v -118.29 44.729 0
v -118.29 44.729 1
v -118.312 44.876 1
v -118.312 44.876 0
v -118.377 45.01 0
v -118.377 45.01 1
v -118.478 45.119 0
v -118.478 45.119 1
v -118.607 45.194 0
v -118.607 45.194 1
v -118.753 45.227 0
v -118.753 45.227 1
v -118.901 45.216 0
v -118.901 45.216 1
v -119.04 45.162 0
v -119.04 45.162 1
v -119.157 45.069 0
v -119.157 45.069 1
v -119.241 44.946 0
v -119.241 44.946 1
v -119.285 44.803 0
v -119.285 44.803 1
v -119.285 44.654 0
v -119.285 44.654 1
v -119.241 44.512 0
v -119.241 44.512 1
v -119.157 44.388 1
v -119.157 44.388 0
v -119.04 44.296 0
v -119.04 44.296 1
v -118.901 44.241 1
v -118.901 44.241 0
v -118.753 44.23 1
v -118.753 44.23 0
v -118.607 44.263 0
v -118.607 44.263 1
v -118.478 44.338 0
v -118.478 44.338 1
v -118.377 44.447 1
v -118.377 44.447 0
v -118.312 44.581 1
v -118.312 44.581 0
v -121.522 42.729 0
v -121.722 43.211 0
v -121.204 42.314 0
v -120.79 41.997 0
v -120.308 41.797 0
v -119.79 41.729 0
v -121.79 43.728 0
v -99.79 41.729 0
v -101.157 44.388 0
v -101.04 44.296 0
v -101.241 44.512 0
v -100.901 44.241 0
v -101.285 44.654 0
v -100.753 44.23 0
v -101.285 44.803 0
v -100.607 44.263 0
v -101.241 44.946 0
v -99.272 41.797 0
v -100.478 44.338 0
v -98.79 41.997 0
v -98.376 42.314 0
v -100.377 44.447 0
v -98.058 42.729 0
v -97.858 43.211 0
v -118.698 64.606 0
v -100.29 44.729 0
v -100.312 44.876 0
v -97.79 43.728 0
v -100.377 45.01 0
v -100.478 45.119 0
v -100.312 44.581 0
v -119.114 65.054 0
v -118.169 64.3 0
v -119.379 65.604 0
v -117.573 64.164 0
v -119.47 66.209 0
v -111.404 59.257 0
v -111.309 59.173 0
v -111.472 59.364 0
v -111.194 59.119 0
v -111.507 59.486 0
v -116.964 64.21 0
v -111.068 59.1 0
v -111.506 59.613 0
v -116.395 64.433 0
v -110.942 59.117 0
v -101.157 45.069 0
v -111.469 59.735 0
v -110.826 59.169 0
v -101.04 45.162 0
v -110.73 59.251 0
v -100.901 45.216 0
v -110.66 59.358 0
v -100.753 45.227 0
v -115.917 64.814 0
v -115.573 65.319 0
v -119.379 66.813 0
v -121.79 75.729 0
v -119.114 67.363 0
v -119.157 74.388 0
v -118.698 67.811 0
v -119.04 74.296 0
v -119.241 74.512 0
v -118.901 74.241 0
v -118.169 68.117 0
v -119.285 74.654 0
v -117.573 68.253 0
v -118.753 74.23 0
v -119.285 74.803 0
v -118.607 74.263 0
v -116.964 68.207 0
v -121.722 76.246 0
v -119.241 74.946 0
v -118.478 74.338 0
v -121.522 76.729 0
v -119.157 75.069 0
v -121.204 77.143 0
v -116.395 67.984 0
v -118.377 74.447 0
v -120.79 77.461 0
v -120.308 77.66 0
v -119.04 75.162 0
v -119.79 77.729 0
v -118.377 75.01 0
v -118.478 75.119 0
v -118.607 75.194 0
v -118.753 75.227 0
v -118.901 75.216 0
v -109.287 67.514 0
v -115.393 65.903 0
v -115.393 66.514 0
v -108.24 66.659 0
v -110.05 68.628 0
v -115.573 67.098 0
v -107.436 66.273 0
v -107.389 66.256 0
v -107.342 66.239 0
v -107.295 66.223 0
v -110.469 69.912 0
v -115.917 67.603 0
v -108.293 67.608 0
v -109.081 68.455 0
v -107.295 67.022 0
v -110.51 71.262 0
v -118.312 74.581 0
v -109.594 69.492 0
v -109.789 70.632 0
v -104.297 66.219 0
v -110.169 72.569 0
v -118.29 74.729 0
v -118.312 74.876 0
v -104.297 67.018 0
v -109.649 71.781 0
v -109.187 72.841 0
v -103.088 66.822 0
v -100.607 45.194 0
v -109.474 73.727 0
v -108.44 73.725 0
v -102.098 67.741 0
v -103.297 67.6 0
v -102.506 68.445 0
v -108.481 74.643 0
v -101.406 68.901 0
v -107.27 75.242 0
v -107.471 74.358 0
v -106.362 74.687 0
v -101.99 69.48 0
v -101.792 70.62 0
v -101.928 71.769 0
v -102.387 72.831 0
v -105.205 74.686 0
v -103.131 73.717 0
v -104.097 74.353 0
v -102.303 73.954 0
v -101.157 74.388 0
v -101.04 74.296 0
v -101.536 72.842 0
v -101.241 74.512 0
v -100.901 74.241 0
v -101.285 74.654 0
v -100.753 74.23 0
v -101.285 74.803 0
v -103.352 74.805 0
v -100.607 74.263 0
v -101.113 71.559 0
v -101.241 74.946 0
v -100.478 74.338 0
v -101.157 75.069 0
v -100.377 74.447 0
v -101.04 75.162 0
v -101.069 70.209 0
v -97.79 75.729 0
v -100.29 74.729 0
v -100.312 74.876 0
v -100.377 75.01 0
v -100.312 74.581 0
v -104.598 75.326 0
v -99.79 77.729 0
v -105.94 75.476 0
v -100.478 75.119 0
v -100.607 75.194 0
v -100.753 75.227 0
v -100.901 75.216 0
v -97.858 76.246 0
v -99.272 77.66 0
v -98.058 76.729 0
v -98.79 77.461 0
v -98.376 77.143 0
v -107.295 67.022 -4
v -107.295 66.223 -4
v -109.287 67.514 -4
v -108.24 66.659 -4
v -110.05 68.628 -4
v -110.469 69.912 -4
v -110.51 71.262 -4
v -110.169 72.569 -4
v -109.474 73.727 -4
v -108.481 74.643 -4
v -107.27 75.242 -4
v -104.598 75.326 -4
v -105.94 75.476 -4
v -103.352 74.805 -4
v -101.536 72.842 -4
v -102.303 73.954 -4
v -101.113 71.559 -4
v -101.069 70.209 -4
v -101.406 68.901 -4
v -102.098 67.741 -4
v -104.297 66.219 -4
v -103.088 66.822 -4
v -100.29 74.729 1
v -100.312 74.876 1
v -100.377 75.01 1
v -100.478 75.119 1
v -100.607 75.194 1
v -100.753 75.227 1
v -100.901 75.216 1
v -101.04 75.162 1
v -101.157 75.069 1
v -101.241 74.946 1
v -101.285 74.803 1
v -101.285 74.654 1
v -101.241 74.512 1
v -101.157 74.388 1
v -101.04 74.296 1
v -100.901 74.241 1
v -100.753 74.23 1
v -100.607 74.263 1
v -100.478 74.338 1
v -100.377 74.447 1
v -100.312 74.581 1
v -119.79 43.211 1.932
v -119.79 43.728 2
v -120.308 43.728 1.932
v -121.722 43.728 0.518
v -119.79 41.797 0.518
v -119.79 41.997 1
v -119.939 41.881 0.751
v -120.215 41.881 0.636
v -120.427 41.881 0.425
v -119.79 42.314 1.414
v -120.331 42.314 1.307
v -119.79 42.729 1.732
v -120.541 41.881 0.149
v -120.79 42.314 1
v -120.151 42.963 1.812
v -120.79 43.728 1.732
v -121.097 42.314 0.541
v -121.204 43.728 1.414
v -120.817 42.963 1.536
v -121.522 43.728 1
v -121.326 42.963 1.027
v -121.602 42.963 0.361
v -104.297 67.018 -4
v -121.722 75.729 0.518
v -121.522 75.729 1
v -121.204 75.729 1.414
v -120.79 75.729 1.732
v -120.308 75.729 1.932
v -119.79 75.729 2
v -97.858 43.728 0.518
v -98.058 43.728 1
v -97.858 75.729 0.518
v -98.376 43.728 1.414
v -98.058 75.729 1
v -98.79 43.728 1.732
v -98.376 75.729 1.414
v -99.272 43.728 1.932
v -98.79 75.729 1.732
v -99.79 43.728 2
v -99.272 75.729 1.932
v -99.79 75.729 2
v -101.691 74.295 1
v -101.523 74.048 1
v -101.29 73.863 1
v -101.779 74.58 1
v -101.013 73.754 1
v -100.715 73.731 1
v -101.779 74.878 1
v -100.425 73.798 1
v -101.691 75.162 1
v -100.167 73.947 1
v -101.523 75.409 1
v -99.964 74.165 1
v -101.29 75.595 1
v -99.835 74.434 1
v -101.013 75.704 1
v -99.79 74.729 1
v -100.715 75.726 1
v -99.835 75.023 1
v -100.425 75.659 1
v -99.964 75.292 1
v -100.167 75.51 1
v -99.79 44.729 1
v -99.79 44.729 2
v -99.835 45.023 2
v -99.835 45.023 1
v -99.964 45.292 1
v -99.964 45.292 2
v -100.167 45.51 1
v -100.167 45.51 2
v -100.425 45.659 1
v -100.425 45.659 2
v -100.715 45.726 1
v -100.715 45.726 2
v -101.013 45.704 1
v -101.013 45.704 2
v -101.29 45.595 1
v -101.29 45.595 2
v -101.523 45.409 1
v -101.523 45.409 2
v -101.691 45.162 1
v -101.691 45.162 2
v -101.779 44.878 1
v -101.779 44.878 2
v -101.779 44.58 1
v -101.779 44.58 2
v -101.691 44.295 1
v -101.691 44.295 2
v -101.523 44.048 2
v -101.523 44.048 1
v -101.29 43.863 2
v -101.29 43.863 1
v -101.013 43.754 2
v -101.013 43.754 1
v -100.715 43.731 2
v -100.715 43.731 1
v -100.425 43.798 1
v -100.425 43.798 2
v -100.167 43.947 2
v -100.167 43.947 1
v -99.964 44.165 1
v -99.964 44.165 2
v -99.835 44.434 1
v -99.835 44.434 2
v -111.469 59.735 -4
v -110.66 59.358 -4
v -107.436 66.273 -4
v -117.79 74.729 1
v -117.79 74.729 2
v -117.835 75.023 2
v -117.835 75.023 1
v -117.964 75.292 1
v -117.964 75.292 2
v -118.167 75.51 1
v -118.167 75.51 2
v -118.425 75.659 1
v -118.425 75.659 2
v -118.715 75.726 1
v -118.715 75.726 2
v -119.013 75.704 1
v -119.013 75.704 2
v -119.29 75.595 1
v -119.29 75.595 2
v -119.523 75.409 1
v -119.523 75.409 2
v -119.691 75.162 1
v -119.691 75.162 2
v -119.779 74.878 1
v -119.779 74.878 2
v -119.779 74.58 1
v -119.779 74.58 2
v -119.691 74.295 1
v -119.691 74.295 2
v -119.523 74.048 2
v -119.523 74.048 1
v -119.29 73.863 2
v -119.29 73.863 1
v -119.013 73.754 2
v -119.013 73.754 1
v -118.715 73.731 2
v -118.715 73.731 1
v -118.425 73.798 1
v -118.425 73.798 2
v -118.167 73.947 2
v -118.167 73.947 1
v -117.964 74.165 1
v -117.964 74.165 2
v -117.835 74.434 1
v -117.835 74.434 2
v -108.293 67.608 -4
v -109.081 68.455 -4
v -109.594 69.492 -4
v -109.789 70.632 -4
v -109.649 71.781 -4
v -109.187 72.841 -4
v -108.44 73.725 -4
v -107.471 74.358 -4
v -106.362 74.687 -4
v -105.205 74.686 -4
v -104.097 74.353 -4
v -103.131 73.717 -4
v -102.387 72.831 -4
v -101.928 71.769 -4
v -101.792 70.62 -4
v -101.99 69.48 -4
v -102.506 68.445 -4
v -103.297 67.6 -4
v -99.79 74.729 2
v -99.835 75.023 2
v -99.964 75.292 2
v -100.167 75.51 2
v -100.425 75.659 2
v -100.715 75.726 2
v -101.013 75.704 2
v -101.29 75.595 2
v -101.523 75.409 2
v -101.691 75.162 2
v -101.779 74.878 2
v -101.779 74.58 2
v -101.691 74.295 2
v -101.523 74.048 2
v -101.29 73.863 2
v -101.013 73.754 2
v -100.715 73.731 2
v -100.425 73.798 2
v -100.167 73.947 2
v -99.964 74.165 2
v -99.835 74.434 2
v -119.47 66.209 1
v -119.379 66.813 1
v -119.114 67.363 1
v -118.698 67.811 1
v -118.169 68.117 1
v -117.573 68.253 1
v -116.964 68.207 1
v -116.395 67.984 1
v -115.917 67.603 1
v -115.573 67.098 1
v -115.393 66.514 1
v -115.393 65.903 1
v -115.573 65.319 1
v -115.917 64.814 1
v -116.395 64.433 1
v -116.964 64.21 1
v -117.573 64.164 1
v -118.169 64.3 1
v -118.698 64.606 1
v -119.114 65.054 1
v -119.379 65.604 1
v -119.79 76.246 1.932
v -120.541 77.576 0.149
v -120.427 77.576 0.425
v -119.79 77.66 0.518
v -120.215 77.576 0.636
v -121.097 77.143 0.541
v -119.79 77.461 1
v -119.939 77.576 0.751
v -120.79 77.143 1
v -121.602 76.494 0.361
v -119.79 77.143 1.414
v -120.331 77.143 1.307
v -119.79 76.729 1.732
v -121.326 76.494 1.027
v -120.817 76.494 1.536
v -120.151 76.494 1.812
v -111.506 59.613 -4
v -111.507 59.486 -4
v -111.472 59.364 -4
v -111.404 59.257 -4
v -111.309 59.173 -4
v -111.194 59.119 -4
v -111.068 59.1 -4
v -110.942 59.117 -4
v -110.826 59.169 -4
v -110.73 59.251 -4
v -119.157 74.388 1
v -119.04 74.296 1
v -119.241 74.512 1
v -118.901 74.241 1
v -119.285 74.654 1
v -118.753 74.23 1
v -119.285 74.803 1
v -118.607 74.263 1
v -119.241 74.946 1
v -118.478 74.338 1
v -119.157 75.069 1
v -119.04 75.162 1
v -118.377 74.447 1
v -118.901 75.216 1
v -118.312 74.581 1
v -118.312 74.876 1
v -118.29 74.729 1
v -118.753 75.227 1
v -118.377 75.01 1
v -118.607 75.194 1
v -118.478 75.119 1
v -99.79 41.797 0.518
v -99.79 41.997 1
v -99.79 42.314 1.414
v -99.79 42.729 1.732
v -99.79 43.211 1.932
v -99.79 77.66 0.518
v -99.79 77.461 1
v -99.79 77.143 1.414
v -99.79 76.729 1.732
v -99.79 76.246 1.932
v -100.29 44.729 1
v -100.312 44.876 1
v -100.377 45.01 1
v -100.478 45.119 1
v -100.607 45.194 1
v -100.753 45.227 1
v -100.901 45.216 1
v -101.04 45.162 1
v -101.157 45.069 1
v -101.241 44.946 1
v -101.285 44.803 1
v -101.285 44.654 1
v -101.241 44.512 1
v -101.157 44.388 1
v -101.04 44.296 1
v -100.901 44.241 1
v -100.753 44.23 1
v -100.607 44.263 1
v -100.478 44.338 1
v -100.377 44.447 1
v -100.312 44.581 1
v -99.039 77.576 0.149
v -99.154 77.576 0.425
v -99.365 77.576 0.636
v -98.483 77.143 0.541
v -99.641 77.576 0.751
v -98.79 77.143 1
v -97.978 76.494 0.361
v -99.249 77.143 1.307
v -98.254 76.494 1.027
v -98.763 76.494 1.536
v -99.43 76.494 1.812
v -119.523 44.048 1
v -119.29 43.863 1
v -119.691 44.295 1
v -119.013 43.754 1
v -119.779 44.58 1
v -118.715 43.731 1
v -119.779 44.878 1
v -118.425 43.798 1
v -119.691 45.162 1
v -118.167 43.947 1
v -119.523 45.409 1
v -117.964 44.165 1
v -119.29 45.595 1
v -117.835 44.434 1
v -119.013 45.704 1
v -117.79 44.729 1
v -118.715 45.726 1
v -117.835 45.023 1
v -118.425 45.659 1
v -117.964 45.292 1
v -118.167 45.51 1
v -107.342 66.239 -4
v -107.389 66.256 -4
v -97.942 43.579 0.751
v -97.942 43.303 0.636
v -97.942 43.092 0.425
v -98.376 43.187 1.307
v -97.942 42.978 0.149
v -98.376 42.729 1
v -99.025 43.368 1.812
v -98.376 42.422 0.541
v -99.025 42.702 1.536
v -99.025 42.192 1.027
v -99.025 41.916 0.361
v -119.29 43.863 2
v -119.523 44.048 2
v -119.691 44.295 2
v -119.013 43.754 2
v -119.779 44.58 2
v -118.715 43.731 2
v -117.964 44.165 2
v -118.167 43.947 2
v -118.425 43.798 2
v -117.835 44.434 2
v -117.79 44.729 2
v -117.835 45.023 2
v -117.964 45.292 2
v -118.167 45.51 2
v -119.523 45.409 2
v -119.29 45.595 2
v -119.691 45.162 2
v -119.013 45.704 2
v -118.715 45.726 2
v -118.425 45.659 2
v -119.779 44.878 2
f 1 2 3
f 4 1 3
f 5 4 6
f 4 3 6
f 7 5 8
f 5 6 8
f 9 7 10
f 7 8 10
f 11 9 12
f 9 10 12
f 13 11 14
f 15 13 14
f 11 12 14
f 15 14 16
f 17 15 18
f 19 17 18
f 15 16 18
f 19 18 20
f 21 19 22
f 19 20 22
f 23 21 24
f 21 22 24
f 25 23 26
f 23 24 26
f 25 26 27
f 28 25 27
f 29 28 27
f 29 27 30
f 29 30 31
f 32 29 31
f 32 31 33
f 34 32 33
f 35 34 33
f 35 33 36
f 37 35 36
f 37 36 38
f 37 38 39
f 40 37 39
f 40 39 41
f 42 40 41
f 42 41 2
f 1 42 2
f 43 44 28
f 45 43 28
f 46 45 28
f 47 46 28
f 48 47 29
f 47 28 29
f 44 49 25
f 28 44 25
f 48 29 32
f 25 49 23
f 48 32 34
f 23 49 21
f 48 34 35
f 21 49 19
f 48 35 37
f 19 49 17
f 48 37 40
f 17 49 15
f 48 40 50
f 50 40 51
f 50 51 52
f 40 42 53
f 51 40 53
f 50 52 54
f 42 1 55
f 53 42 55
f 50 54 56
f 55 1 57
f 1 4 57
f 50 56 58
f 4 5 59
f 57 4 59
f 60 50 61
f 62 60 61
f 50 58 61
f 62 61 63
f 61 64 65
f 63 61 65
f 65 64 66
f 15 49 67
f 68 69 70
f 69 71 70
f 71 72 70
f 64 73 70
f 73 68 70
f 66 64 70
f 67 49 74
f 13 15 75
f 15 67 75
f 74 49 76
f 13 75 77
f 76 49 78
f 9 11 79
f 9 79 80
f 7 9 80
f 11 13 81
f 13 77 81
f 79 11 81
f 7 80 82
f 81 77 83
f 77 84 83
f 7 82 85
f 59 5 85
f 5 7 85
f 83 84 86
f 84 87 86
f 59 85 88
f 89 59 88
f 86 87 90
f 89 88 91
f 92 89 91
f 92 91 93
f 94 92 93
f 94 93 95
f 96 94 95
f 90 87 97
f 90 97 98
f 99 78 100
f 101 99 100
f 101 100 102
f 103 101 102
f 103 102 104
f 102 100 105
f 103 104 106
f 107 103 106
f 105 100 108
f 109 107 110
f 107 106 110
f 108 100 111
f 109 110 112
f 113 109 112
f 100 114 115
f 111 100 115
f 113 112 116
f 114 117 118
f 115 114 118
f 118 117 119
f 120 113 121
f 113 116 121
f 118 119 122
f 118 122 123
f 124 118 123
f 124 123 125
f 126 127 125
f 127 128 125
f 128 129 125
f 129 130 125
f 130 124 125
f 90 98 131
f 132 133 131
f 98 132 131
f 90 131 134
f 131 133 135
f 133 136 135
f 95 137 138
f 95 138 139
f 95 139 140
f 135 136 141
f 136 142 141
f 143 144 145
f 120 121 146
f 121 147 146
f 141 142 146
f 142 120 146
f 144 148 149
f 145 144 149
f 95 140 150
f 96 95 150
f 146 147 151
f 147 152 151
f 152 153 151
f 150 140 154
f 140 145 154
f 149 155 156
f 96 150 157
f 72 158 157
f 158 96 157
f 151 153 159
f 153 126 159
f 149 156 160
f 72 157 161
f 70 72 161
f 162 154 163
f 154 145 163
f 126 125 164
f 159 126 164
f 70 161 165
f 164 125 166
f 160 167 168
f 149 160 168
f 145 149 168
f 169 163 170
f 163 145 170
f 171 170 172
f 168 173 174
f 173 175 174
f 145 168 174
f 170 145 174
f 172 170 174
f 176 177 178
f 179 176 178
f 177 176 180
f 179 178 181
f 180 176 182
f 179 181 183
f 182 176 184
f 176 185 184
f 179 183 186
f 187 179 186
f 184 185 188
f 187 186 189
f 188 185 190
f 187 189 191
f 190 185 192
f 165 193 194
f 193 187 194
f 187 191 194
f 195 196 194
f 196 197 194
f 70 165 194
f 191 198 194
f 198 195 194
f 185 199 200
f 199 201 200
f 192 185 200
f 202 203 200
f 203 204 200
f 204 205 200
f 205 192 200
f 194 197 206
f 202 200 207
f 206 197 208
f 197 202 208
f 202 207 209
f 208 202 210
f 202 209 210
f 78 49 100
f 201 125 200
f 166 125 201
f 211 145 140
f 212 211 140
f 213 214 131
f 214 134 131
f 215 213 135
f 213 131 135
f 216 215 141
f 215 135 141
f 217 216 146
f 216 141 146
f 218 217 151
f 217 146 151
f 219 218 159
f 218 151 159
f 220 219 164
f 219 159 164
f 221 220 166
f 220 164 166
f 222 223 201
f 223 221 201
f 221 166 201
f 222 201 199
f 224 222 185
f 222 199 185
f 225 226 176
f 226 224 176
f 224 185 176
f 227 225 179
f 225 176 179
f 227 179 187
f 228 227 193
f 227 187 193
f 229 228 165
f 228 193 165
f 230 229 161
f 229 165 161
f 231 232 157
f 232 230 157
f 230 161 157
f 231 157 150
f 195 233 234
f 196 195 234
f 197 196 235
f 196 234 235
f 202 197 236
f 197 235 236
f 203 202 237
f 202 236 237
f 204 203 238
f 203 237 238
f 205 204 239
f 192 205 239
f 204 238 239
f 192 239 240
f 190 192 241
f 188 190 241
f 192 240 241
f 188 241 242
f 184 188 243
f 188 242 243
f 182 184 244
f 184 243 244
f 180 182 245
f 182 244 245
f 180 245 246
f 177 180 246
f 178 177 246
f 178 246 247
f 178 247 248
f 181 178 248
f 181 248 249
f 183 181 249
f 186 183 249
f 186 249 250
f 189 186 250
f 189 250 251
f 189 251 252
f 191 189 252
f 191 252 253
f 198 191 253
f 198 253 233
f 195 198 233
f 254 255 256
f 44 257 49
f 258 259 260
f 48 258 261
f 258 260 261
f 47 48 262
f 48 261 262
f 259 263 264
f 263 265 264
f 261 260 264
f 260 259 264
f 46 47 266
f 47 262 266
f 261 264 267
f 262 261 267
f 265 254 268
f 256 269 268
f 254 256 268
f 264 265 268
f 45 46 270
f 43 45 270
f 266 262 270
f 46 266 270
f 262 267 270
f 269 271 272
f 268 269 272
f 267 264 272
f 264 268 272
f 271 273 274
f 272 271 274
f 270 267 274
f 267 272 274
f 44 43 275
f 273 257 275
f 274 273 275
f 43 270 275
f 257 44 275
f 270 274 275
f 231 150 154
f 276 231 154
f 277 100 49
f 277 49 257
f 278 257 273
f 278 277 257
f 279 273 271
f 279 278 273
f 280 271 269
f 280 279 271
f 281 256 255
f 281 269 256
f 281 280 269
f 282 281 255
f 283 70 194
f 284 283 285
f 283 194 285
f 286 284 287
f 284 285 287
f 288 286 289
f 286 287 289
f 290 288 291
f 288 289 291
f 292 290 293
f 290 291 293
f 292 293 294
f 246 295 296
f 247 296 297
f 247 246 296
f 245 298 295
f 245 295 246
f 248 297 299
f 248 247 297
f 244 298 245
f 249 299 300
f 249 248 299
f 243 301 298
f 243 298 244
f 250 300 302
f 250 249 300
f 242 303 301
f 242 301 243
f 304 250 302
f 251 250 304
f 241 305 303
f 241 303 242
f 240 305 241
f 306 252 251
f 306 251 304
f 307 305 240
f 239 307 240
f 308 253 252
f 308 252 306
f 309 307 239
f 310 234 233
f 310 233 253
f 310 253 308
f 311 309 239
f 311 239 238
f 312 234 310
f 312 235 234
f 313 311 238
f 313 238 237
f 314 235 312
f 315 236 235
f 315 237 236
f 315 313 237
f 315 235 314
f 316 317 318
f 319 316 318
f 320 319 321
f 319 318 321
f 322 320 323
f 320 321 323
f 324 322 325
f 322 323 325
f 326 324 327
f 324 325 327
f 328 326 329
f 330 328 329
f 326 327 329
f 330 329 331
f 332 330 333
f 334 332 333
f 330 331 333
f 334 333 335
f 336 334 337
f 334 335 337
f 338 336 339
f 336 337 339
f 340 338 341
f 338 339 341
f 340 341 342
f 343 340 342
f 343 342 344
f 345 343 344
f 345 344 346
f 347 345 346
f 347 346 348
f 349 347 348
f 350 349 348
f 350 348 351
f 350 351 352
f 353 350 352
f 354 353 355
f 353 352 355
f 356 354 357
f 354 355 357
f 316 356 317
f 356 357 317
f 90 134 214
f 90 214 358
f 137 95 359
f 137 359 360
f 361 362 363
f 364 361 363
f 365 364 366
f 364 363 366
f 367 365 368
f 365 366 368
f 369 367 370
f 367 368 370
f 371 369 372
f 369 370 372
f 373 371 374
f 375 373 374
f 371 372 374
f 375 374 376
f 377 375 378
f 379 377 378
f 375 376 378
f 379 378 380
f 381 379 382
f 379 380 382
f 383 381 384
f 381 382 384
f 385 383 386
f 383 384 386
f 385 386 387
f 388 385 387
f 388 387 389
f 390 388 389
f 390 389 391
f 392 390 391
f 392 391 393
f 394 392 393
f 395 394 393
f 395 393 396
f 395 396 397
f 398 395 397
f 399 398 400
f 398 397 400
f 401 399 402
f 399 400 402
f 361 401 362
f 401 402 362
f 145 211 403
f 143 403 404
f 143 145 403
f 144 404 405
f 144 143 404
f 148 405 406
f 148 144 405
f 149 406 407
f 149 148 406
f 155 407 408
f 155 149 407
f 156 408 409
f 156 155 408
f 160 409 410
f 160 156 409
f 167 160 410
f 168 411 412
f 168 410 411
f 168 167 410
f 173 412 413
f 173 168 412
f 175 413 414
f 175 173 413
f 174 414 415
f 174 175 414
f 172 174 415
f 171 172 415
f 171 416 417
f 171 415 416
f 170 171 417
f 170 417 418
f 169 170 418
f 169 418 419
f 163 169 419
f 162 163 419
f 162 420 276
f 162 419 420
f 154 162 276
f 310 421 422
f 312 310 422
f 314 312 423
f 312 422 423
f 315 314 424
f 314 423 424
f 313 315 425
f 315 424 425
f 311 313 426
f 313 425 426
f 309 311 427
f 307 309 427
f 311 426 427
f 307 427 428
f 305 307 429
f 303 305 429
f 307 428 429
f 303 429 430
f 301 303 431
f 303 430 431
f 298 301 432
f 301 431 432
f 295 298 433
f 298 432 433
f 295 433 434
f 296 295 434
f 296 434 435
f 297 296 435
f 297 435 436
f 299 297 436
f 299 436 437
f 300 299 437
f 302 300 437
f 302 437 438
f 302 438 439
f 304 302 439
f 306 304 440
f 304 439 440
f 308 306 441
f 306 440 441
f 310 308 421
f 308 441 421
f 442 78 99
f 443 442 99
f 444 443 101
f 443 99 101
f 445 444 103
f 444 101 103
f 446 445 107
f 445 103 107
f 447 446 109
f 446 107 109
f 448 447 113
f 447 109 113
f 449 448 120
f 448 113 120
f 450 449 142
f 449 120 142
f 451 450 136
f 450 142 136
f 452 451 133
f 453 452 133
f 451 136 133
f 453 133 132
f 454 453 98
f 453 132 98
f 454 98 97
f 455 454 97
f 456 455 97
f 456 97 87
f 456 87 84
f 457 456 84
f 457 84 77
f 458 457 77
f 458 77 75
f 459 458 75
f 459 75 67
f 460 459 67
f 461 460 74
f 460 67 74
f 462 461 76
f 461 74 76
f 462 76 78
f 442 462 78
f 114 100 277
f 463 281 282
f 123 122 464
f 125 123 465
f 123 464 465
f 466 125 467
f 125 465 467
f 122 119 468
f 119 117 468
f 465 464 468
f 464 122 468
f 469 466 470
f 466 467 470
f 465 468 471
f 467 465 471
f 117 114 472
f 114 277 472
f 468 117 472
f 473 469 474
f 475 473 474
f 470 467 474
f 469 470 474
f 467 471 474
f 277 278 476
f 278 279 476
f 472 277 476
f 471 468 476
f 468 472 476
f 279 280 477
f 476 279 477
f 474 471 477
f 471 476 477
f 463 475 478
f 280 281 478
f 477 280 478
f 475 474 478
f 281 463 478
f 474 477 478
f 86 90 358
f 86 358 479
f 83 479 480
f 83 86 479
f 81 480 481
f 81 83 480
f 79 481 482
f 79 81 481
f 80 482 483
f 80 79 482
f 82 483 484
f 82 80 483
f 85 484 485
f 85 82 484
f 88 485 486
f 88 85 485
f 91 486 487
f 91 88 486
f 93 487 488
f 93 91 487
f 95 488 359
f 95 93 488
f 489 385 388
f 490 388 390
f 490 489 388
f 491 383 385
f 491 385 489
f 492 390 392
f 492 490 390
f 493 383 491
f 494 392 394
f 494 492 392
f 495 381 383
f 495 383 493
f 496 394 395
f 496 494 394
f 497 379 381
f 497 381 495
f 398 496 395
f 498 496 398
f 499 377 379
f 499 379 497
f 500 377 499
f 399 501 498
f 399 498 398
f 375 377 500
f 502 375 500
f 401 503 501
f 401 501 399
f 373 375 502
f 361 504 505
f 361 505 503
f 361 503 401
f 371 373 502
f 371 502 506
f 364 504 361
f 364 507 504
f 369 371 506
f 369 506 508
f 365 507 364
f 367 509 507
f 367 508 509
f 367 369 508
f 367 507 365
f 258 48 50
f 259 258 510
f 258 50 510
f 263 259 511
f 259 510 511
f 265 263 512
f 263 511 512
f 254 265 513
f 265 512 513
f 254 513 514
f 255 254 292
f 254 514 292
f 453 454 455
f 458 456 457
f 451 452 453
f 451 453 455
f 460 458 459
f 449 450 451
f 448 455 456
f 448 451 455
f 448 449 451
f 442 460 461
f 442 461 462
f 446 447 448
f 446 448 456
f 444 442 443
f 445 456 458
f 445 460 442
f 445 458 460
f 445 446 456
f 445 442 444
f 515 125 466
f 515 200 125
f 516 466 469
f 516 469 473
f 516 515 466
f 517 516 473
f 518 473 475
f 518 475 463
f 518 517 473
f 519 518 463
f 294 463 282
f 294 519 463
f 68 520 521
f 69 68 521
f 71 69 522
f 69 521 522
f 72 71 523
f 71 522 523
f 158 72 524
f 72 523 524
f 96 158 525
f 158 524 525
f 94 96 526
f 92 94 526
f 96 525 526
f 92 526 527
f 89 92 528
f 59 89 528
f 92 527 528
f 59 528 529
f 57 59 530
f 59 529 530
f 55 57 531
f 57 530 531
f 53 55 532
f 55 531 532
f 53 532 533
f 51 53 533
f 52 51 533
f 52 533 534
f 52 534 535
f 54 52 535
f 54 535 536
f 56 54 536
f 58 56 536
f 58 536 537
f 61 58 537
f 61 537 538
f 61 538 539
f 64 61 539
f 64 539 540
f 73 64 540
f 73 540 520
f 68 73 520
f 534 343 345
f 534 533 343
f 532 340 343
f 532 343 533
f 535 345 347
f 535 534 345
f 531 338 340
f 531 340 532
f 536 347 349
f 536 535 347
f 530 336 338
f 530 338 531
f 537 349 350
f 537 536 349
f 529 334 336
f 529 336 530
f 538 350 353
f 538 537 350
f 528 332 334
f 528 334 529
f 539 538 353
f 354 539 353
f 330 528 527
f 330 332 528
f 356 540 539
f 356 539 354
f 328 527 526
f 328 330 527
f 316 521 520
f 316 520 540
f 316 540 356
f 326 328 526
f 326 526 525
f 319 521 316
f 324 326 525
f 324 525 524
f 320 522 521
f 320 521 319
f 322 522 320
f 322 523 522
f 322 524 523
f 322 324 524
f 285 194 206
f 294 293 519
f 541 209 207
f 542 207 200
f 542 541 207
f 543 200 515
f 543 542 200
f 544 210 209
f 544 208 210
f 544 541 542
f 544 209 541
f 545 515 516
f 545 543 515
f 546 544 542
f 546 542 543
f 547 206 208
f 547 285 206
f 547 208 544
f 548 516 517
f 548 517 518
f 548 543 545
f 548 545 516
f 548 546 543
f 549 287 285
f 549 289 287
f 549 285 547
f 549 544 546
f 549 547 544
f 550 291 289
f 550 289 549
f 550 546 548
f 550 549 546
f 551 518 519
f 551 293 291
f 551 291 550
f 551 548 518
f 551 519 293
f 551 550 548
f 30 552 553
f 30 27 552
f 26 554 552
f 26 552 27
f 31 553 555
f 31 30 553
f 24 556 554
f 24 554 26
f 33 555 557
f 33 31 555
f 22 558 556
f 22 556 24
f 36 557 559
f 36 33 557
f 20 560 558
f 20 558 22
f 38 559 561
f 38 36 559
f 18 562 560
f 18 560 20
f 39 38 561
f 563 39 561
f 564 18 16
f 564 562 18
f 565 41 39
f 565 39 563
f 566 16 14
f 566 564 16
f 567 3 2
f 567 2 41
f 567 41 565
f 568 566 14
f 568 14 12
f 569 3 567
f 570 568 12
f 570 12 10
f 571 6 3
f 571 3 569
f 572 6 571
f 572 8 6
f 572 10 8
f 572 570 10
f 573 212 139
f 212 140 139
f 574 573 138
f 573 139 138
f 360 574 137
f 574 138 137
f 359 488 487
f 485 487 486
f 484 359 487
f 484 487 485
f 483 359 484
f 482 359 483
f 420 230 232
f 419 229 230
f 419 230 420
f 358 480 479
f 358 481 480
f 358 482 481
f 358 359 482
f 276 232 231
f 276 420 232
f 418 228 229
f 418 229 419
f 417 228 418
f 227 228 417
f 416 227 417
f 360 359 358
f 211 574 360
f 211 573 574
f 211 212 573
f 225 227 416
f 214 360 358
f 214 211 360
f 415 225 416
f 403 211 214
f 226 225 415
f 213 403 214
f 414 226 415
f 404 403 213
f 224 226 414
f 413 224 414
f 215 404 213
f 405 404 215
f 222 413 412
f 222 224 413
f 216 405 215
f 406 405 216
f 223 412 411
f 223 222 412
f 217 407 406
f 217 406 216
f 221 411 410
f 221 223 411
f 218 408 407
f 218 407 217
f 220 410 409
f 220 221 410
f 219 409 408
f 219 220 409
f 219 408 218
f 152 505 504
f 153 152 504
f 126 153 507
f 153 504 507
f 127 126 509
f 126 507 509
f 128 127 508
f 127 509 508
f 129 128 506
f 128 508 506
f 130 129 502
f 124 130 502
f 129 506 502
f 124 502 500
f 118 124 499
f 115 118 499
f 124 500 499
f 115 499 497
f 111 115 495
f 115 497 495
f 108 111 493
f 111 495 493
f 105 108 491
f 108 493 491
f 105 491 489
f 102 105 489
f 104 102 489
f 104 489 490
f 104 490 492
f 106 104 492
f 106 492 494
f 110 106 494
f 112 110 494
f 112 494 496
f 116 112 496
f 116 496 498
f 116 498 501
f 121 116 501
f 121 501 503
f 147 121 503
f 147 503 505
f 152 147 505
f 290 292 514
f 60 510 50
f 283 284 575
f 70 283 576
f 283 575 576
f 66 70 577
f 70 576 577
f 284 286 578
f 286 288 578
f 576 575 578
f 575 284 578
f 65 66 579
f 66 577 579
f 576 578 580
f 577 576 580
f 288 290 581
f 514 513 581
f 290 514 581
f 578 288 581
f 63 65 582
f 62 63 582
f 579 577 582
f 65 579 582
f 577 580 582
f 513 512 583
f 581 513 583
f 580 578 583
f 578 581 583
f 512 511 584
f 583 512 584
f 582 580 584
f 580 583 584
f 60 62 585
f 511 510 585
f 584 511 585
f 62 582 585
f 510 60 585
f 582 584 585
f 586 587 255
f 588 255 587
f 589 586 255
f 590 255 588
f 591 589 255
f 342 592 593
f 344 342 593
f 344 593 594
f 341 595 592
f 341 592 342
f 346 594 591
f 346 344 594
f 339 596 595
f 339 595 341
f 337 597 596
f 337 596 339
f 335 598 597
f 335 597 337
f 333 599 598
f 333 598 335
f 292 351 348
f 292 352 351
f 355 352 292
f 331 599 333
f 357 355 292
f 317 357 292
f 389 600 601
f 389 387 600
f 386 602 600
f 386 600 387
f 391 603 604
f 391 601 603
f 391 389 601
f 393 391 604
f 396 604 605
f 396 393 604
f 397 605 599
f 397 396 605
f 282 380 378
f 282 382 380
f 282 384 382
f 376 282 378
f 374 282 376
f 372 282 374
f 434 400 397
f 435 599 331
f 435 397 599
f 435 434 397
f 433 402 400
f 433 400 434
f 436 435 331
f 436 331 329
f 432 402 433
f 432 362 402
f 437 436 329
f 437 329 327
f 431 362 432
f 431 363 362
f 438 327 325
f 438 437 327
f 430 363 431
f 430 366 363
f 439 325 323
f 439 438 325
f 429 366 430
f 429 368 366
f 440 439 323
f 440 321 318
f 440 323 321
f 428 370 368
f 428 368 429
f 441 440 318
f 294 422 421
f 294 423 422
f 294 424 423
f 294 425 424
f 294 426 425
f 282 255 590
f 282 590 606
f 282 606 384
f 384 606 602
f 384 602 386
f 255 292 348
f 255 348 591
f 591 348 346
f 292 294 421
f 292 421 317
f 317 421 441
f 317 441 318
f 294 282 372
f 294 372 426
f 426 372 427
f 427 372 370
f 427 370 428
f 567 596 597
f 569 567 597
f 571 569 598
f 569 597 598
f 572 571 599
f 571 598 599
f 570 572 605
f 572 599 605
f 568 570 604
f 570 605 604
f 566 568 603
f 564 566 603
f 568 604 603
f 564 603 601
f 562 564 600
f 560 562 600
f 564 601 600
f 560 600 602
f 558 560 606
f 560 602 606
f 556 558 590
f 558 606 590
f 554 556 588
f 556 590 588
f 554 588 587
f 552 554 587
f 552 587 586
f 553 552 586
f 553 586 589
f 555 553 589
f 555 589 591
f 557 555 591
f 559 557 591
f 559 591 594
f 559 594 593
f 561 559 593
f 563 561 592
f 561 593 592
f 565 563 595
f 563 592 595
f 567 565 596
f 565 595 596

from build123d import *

# Parameters (mm, degrees)
SKETCH_1_W          = 24
SKETCH_1_H          = 36
EXTRUDE_1_DEPTH     = 2
FILLET_1_R          = 2
SKETCH_4_R          = 2.05
CUT_EXTRUDE_1_DEPTH = 1
SKETCH_7_R          = 4.75
SKETCH_7_R_2        = 4
EXTRUDE_2_DEPTH     = 4
CUT_EXTRUDE_2_DEPTH = 4
SKETCH_9_R          = 1
CUT_EXTRUDE_3_DEPTH = 1
CUT_EXTRUDE_4_REACH = 146.567
SKETCH_10_R         = 0.5
EXTRUDE_3_DEPTH     = 4


with BuildPart() as part:
    # 草图1 → 凸台-拉伸1 (new body)
    with BuildSketch(Plane.XY):
        with Locations((-109.790086771, 59.72858385)):
            Rectangle(SKETCH_1_W, SKETCH_1_H)
    extrude(amount=EXTRUDE_1_DEPTH)

    # 圆角1
    fillet_1_edges = [part.edges().sort_by_distance(p)[0] for p in [
        (-121.790086771, 59.72858385, 2),
        (-109.790086771, 41.72858385, 2),
        (-97.790086771, 59.72858385, 2),
        (-97.790086771, 41.72858385, 1),
        (-121.790086771, 41.72858385, 1),
        (-121.790086771, 77.72858385, 1),
        (-97.790086771, 77.72858385, 1),
        (-109.790086771, 77.72858385, 2),
    ]]
    fillet(fillet_1_edges, radius=FILLET_1_R - 0.0001)  # a hair under: the kernel refuses the full size

    # 草图4 → 切除-拉伸1 (cut)
    with BuildSketch(Plane(origin=(0, 0, 0), x_dir=(-1, 0, 0), z_dir=(0, 0, -1))):
        with Locations((117.420086771, 66.20858385)):
            Circle(SKETCH_4_R)
    extrude(amount=-CUT_EXTRUDE_1_DEPTH, mode=Mode.SUBTRACT)

    # 草图7 → 凸台-拉伸2 (add)
    with BuildSketch(Plane(origin=(0, 0, 0), x_dir=(-1, 0, 0), z_dir=(0, 0, -1))):
        with Locations((105.790086771, 70.72858385)):
            Circle(SKETCH_7_R)
        with Locations((105.790086771, 70.72858385)):
            Circle(SKETCH_7_R_2, mode=Mode.SUBTRACT)
    extrude(amount=EXTRUDE_2_DEPTH)

    # 草图8 → 切除-拉伸2 (cut)
    with BuildSketch(Plane(origin=(0, 0, -4), x_dir=(-1, 0, 0), z_dir=(0, 0, -1))):
        Polygon((107.295042198, 64.806439923), (104.296751001, 64.705198151), (104.296751001, 67.705198151), (107.295042198, 67.705198151), align=None)
    extrude(amount=-CUT_EXTRUDE_2_DEPTH, mode=Mode.SUBTRACT)

    # 草图9 → 切除-拉伸3 (cut)
    with BuildSketch(Plane.XY.offset(2)):
        with Locations((-100.790086771, 74.72858385)):
            Circle(SKETCH_9_R)
        with Locations((-100.790086771, 44.72858385)):
            Circle(SKETCH_9_R)
        with Locations((-118.790086771, 44.72858385)):
            Circle(SKETCH_9_R)
        with Locations((-118.790086771, 74.72858385)):
            Circle(SKETCH_9_R)
    extrude(amount=-CUT_EXTRUDE_3_DEPTH, mode=Mode.SUBTRACT)

    # 草图10 → 切除-拉伸4 (cut, up to next)
    with BuildSketch(Plane.XY.offset(1), mode=Mode.PRIVATE) as cut_extrude_4_sk1:
        with Locations((-118.790086771, 44.72858385)):
            Circle(SKETCH_10_R)
    cut_extrude_4_tool1 = extrude(cut_extrude_4_sk1.sketch, amount=-CUT_EXTRUDE_4_REACH, mode=Mode.PRIVATE) & part.part
    # 草图10 → 切除-拉伸4 (cut, up to next)
    with BuildSketch(Plane.XY.offset(1), mode=Mode.PRIVATE) as cut_extrude_4_sk2:
        with Locations((-100.790086771, 44.72858385)):
            Circle(SKETCH_10_R)
    cut_extrude_4_tool2 = extrude(cut_extrude_4_sk2.sketch, amount=-CUT_EXTRUDE_4_REACH, mode=Mode.PRIVATE) & part.part
    # 草图10 → 切除-拉伸4 (cut, up to next)
    with BuildSketch(Plane.XY.offset(1), mode=Mode.PRIVATE) as cut_extrude_4_sk3:
        with Locations((-100.790086771, 74.72858385)):
            Circle(SKETCH_10_R)
    cut_extrude_4_tool3 = extrude(cut_extrude_4_sk3.sketch, amount=-CUT_EXTRUDE_4_REACH, mode=Mode.PRIVATE) & part.part
    # 草图10 → 切除-拉伸4 (cut, up to next)
    with BuildSketch(Plane.XY.offset(1), mode=Mode.PRIVATE) as cut_extrude_4_sk4:
        with Locations((-118.790086771, 74.72858385)):
            Circle(SKETCH_10_R)
    cut_extrude_4_tool4 = extrude(cut_extrude_4_sk4.sketch, amount=-CUT_EXTRUDE_4_REACH, mode=Mode.PRIVATE) & part.part
    add(cut_extrude_4_tool1.solids().sort_by_distance((-118.790087, 44.728584, 1))[0], mode=Mode.SUBTRACT)
    add(cut_extrude_4_tool2.solids().sort_by_distance((-100.790087, 44.728584, 1))[0], mode=Mode.SUBTRACT)
    add(cut_extrude_4_tool3.solids().sort_by_distance((-100.790087, 74.728584, 1))[0], mode=Mode.SUBTRACT)
    add(cut_extrude_4_tool4.solids().sort_by_distance((-118.790087, 74.728584, 1))[0], mode=Mode.SUBTRACT)

    # 草图12 → 凸台-拉伸3 (add)
    with BuildSketch(Plane(origin=(0, 0, 0), x_dir=(-1, 0, 0), z_dir=(0, 0, -1))):
        with BuildLine():
            Line((108.145924466, 66.861652665), (111.46923478, 59.734790696))
            ThreePointArc((111.46923478, 59.734790696), (111.253339507, 59.141623309), (110.66017212, 59.357518582))
            Line((110.66017212, 59.357518582), (107.336861805, 66.484380551))
            ThreePointArc((107.336861805, 66.484380551), (107.552757078, 67.077547938), (108.145924466, 66.861652665))
        make_face()
    extrude(amount=EXTRUDE_3_DEPTH)


solid = part.part
